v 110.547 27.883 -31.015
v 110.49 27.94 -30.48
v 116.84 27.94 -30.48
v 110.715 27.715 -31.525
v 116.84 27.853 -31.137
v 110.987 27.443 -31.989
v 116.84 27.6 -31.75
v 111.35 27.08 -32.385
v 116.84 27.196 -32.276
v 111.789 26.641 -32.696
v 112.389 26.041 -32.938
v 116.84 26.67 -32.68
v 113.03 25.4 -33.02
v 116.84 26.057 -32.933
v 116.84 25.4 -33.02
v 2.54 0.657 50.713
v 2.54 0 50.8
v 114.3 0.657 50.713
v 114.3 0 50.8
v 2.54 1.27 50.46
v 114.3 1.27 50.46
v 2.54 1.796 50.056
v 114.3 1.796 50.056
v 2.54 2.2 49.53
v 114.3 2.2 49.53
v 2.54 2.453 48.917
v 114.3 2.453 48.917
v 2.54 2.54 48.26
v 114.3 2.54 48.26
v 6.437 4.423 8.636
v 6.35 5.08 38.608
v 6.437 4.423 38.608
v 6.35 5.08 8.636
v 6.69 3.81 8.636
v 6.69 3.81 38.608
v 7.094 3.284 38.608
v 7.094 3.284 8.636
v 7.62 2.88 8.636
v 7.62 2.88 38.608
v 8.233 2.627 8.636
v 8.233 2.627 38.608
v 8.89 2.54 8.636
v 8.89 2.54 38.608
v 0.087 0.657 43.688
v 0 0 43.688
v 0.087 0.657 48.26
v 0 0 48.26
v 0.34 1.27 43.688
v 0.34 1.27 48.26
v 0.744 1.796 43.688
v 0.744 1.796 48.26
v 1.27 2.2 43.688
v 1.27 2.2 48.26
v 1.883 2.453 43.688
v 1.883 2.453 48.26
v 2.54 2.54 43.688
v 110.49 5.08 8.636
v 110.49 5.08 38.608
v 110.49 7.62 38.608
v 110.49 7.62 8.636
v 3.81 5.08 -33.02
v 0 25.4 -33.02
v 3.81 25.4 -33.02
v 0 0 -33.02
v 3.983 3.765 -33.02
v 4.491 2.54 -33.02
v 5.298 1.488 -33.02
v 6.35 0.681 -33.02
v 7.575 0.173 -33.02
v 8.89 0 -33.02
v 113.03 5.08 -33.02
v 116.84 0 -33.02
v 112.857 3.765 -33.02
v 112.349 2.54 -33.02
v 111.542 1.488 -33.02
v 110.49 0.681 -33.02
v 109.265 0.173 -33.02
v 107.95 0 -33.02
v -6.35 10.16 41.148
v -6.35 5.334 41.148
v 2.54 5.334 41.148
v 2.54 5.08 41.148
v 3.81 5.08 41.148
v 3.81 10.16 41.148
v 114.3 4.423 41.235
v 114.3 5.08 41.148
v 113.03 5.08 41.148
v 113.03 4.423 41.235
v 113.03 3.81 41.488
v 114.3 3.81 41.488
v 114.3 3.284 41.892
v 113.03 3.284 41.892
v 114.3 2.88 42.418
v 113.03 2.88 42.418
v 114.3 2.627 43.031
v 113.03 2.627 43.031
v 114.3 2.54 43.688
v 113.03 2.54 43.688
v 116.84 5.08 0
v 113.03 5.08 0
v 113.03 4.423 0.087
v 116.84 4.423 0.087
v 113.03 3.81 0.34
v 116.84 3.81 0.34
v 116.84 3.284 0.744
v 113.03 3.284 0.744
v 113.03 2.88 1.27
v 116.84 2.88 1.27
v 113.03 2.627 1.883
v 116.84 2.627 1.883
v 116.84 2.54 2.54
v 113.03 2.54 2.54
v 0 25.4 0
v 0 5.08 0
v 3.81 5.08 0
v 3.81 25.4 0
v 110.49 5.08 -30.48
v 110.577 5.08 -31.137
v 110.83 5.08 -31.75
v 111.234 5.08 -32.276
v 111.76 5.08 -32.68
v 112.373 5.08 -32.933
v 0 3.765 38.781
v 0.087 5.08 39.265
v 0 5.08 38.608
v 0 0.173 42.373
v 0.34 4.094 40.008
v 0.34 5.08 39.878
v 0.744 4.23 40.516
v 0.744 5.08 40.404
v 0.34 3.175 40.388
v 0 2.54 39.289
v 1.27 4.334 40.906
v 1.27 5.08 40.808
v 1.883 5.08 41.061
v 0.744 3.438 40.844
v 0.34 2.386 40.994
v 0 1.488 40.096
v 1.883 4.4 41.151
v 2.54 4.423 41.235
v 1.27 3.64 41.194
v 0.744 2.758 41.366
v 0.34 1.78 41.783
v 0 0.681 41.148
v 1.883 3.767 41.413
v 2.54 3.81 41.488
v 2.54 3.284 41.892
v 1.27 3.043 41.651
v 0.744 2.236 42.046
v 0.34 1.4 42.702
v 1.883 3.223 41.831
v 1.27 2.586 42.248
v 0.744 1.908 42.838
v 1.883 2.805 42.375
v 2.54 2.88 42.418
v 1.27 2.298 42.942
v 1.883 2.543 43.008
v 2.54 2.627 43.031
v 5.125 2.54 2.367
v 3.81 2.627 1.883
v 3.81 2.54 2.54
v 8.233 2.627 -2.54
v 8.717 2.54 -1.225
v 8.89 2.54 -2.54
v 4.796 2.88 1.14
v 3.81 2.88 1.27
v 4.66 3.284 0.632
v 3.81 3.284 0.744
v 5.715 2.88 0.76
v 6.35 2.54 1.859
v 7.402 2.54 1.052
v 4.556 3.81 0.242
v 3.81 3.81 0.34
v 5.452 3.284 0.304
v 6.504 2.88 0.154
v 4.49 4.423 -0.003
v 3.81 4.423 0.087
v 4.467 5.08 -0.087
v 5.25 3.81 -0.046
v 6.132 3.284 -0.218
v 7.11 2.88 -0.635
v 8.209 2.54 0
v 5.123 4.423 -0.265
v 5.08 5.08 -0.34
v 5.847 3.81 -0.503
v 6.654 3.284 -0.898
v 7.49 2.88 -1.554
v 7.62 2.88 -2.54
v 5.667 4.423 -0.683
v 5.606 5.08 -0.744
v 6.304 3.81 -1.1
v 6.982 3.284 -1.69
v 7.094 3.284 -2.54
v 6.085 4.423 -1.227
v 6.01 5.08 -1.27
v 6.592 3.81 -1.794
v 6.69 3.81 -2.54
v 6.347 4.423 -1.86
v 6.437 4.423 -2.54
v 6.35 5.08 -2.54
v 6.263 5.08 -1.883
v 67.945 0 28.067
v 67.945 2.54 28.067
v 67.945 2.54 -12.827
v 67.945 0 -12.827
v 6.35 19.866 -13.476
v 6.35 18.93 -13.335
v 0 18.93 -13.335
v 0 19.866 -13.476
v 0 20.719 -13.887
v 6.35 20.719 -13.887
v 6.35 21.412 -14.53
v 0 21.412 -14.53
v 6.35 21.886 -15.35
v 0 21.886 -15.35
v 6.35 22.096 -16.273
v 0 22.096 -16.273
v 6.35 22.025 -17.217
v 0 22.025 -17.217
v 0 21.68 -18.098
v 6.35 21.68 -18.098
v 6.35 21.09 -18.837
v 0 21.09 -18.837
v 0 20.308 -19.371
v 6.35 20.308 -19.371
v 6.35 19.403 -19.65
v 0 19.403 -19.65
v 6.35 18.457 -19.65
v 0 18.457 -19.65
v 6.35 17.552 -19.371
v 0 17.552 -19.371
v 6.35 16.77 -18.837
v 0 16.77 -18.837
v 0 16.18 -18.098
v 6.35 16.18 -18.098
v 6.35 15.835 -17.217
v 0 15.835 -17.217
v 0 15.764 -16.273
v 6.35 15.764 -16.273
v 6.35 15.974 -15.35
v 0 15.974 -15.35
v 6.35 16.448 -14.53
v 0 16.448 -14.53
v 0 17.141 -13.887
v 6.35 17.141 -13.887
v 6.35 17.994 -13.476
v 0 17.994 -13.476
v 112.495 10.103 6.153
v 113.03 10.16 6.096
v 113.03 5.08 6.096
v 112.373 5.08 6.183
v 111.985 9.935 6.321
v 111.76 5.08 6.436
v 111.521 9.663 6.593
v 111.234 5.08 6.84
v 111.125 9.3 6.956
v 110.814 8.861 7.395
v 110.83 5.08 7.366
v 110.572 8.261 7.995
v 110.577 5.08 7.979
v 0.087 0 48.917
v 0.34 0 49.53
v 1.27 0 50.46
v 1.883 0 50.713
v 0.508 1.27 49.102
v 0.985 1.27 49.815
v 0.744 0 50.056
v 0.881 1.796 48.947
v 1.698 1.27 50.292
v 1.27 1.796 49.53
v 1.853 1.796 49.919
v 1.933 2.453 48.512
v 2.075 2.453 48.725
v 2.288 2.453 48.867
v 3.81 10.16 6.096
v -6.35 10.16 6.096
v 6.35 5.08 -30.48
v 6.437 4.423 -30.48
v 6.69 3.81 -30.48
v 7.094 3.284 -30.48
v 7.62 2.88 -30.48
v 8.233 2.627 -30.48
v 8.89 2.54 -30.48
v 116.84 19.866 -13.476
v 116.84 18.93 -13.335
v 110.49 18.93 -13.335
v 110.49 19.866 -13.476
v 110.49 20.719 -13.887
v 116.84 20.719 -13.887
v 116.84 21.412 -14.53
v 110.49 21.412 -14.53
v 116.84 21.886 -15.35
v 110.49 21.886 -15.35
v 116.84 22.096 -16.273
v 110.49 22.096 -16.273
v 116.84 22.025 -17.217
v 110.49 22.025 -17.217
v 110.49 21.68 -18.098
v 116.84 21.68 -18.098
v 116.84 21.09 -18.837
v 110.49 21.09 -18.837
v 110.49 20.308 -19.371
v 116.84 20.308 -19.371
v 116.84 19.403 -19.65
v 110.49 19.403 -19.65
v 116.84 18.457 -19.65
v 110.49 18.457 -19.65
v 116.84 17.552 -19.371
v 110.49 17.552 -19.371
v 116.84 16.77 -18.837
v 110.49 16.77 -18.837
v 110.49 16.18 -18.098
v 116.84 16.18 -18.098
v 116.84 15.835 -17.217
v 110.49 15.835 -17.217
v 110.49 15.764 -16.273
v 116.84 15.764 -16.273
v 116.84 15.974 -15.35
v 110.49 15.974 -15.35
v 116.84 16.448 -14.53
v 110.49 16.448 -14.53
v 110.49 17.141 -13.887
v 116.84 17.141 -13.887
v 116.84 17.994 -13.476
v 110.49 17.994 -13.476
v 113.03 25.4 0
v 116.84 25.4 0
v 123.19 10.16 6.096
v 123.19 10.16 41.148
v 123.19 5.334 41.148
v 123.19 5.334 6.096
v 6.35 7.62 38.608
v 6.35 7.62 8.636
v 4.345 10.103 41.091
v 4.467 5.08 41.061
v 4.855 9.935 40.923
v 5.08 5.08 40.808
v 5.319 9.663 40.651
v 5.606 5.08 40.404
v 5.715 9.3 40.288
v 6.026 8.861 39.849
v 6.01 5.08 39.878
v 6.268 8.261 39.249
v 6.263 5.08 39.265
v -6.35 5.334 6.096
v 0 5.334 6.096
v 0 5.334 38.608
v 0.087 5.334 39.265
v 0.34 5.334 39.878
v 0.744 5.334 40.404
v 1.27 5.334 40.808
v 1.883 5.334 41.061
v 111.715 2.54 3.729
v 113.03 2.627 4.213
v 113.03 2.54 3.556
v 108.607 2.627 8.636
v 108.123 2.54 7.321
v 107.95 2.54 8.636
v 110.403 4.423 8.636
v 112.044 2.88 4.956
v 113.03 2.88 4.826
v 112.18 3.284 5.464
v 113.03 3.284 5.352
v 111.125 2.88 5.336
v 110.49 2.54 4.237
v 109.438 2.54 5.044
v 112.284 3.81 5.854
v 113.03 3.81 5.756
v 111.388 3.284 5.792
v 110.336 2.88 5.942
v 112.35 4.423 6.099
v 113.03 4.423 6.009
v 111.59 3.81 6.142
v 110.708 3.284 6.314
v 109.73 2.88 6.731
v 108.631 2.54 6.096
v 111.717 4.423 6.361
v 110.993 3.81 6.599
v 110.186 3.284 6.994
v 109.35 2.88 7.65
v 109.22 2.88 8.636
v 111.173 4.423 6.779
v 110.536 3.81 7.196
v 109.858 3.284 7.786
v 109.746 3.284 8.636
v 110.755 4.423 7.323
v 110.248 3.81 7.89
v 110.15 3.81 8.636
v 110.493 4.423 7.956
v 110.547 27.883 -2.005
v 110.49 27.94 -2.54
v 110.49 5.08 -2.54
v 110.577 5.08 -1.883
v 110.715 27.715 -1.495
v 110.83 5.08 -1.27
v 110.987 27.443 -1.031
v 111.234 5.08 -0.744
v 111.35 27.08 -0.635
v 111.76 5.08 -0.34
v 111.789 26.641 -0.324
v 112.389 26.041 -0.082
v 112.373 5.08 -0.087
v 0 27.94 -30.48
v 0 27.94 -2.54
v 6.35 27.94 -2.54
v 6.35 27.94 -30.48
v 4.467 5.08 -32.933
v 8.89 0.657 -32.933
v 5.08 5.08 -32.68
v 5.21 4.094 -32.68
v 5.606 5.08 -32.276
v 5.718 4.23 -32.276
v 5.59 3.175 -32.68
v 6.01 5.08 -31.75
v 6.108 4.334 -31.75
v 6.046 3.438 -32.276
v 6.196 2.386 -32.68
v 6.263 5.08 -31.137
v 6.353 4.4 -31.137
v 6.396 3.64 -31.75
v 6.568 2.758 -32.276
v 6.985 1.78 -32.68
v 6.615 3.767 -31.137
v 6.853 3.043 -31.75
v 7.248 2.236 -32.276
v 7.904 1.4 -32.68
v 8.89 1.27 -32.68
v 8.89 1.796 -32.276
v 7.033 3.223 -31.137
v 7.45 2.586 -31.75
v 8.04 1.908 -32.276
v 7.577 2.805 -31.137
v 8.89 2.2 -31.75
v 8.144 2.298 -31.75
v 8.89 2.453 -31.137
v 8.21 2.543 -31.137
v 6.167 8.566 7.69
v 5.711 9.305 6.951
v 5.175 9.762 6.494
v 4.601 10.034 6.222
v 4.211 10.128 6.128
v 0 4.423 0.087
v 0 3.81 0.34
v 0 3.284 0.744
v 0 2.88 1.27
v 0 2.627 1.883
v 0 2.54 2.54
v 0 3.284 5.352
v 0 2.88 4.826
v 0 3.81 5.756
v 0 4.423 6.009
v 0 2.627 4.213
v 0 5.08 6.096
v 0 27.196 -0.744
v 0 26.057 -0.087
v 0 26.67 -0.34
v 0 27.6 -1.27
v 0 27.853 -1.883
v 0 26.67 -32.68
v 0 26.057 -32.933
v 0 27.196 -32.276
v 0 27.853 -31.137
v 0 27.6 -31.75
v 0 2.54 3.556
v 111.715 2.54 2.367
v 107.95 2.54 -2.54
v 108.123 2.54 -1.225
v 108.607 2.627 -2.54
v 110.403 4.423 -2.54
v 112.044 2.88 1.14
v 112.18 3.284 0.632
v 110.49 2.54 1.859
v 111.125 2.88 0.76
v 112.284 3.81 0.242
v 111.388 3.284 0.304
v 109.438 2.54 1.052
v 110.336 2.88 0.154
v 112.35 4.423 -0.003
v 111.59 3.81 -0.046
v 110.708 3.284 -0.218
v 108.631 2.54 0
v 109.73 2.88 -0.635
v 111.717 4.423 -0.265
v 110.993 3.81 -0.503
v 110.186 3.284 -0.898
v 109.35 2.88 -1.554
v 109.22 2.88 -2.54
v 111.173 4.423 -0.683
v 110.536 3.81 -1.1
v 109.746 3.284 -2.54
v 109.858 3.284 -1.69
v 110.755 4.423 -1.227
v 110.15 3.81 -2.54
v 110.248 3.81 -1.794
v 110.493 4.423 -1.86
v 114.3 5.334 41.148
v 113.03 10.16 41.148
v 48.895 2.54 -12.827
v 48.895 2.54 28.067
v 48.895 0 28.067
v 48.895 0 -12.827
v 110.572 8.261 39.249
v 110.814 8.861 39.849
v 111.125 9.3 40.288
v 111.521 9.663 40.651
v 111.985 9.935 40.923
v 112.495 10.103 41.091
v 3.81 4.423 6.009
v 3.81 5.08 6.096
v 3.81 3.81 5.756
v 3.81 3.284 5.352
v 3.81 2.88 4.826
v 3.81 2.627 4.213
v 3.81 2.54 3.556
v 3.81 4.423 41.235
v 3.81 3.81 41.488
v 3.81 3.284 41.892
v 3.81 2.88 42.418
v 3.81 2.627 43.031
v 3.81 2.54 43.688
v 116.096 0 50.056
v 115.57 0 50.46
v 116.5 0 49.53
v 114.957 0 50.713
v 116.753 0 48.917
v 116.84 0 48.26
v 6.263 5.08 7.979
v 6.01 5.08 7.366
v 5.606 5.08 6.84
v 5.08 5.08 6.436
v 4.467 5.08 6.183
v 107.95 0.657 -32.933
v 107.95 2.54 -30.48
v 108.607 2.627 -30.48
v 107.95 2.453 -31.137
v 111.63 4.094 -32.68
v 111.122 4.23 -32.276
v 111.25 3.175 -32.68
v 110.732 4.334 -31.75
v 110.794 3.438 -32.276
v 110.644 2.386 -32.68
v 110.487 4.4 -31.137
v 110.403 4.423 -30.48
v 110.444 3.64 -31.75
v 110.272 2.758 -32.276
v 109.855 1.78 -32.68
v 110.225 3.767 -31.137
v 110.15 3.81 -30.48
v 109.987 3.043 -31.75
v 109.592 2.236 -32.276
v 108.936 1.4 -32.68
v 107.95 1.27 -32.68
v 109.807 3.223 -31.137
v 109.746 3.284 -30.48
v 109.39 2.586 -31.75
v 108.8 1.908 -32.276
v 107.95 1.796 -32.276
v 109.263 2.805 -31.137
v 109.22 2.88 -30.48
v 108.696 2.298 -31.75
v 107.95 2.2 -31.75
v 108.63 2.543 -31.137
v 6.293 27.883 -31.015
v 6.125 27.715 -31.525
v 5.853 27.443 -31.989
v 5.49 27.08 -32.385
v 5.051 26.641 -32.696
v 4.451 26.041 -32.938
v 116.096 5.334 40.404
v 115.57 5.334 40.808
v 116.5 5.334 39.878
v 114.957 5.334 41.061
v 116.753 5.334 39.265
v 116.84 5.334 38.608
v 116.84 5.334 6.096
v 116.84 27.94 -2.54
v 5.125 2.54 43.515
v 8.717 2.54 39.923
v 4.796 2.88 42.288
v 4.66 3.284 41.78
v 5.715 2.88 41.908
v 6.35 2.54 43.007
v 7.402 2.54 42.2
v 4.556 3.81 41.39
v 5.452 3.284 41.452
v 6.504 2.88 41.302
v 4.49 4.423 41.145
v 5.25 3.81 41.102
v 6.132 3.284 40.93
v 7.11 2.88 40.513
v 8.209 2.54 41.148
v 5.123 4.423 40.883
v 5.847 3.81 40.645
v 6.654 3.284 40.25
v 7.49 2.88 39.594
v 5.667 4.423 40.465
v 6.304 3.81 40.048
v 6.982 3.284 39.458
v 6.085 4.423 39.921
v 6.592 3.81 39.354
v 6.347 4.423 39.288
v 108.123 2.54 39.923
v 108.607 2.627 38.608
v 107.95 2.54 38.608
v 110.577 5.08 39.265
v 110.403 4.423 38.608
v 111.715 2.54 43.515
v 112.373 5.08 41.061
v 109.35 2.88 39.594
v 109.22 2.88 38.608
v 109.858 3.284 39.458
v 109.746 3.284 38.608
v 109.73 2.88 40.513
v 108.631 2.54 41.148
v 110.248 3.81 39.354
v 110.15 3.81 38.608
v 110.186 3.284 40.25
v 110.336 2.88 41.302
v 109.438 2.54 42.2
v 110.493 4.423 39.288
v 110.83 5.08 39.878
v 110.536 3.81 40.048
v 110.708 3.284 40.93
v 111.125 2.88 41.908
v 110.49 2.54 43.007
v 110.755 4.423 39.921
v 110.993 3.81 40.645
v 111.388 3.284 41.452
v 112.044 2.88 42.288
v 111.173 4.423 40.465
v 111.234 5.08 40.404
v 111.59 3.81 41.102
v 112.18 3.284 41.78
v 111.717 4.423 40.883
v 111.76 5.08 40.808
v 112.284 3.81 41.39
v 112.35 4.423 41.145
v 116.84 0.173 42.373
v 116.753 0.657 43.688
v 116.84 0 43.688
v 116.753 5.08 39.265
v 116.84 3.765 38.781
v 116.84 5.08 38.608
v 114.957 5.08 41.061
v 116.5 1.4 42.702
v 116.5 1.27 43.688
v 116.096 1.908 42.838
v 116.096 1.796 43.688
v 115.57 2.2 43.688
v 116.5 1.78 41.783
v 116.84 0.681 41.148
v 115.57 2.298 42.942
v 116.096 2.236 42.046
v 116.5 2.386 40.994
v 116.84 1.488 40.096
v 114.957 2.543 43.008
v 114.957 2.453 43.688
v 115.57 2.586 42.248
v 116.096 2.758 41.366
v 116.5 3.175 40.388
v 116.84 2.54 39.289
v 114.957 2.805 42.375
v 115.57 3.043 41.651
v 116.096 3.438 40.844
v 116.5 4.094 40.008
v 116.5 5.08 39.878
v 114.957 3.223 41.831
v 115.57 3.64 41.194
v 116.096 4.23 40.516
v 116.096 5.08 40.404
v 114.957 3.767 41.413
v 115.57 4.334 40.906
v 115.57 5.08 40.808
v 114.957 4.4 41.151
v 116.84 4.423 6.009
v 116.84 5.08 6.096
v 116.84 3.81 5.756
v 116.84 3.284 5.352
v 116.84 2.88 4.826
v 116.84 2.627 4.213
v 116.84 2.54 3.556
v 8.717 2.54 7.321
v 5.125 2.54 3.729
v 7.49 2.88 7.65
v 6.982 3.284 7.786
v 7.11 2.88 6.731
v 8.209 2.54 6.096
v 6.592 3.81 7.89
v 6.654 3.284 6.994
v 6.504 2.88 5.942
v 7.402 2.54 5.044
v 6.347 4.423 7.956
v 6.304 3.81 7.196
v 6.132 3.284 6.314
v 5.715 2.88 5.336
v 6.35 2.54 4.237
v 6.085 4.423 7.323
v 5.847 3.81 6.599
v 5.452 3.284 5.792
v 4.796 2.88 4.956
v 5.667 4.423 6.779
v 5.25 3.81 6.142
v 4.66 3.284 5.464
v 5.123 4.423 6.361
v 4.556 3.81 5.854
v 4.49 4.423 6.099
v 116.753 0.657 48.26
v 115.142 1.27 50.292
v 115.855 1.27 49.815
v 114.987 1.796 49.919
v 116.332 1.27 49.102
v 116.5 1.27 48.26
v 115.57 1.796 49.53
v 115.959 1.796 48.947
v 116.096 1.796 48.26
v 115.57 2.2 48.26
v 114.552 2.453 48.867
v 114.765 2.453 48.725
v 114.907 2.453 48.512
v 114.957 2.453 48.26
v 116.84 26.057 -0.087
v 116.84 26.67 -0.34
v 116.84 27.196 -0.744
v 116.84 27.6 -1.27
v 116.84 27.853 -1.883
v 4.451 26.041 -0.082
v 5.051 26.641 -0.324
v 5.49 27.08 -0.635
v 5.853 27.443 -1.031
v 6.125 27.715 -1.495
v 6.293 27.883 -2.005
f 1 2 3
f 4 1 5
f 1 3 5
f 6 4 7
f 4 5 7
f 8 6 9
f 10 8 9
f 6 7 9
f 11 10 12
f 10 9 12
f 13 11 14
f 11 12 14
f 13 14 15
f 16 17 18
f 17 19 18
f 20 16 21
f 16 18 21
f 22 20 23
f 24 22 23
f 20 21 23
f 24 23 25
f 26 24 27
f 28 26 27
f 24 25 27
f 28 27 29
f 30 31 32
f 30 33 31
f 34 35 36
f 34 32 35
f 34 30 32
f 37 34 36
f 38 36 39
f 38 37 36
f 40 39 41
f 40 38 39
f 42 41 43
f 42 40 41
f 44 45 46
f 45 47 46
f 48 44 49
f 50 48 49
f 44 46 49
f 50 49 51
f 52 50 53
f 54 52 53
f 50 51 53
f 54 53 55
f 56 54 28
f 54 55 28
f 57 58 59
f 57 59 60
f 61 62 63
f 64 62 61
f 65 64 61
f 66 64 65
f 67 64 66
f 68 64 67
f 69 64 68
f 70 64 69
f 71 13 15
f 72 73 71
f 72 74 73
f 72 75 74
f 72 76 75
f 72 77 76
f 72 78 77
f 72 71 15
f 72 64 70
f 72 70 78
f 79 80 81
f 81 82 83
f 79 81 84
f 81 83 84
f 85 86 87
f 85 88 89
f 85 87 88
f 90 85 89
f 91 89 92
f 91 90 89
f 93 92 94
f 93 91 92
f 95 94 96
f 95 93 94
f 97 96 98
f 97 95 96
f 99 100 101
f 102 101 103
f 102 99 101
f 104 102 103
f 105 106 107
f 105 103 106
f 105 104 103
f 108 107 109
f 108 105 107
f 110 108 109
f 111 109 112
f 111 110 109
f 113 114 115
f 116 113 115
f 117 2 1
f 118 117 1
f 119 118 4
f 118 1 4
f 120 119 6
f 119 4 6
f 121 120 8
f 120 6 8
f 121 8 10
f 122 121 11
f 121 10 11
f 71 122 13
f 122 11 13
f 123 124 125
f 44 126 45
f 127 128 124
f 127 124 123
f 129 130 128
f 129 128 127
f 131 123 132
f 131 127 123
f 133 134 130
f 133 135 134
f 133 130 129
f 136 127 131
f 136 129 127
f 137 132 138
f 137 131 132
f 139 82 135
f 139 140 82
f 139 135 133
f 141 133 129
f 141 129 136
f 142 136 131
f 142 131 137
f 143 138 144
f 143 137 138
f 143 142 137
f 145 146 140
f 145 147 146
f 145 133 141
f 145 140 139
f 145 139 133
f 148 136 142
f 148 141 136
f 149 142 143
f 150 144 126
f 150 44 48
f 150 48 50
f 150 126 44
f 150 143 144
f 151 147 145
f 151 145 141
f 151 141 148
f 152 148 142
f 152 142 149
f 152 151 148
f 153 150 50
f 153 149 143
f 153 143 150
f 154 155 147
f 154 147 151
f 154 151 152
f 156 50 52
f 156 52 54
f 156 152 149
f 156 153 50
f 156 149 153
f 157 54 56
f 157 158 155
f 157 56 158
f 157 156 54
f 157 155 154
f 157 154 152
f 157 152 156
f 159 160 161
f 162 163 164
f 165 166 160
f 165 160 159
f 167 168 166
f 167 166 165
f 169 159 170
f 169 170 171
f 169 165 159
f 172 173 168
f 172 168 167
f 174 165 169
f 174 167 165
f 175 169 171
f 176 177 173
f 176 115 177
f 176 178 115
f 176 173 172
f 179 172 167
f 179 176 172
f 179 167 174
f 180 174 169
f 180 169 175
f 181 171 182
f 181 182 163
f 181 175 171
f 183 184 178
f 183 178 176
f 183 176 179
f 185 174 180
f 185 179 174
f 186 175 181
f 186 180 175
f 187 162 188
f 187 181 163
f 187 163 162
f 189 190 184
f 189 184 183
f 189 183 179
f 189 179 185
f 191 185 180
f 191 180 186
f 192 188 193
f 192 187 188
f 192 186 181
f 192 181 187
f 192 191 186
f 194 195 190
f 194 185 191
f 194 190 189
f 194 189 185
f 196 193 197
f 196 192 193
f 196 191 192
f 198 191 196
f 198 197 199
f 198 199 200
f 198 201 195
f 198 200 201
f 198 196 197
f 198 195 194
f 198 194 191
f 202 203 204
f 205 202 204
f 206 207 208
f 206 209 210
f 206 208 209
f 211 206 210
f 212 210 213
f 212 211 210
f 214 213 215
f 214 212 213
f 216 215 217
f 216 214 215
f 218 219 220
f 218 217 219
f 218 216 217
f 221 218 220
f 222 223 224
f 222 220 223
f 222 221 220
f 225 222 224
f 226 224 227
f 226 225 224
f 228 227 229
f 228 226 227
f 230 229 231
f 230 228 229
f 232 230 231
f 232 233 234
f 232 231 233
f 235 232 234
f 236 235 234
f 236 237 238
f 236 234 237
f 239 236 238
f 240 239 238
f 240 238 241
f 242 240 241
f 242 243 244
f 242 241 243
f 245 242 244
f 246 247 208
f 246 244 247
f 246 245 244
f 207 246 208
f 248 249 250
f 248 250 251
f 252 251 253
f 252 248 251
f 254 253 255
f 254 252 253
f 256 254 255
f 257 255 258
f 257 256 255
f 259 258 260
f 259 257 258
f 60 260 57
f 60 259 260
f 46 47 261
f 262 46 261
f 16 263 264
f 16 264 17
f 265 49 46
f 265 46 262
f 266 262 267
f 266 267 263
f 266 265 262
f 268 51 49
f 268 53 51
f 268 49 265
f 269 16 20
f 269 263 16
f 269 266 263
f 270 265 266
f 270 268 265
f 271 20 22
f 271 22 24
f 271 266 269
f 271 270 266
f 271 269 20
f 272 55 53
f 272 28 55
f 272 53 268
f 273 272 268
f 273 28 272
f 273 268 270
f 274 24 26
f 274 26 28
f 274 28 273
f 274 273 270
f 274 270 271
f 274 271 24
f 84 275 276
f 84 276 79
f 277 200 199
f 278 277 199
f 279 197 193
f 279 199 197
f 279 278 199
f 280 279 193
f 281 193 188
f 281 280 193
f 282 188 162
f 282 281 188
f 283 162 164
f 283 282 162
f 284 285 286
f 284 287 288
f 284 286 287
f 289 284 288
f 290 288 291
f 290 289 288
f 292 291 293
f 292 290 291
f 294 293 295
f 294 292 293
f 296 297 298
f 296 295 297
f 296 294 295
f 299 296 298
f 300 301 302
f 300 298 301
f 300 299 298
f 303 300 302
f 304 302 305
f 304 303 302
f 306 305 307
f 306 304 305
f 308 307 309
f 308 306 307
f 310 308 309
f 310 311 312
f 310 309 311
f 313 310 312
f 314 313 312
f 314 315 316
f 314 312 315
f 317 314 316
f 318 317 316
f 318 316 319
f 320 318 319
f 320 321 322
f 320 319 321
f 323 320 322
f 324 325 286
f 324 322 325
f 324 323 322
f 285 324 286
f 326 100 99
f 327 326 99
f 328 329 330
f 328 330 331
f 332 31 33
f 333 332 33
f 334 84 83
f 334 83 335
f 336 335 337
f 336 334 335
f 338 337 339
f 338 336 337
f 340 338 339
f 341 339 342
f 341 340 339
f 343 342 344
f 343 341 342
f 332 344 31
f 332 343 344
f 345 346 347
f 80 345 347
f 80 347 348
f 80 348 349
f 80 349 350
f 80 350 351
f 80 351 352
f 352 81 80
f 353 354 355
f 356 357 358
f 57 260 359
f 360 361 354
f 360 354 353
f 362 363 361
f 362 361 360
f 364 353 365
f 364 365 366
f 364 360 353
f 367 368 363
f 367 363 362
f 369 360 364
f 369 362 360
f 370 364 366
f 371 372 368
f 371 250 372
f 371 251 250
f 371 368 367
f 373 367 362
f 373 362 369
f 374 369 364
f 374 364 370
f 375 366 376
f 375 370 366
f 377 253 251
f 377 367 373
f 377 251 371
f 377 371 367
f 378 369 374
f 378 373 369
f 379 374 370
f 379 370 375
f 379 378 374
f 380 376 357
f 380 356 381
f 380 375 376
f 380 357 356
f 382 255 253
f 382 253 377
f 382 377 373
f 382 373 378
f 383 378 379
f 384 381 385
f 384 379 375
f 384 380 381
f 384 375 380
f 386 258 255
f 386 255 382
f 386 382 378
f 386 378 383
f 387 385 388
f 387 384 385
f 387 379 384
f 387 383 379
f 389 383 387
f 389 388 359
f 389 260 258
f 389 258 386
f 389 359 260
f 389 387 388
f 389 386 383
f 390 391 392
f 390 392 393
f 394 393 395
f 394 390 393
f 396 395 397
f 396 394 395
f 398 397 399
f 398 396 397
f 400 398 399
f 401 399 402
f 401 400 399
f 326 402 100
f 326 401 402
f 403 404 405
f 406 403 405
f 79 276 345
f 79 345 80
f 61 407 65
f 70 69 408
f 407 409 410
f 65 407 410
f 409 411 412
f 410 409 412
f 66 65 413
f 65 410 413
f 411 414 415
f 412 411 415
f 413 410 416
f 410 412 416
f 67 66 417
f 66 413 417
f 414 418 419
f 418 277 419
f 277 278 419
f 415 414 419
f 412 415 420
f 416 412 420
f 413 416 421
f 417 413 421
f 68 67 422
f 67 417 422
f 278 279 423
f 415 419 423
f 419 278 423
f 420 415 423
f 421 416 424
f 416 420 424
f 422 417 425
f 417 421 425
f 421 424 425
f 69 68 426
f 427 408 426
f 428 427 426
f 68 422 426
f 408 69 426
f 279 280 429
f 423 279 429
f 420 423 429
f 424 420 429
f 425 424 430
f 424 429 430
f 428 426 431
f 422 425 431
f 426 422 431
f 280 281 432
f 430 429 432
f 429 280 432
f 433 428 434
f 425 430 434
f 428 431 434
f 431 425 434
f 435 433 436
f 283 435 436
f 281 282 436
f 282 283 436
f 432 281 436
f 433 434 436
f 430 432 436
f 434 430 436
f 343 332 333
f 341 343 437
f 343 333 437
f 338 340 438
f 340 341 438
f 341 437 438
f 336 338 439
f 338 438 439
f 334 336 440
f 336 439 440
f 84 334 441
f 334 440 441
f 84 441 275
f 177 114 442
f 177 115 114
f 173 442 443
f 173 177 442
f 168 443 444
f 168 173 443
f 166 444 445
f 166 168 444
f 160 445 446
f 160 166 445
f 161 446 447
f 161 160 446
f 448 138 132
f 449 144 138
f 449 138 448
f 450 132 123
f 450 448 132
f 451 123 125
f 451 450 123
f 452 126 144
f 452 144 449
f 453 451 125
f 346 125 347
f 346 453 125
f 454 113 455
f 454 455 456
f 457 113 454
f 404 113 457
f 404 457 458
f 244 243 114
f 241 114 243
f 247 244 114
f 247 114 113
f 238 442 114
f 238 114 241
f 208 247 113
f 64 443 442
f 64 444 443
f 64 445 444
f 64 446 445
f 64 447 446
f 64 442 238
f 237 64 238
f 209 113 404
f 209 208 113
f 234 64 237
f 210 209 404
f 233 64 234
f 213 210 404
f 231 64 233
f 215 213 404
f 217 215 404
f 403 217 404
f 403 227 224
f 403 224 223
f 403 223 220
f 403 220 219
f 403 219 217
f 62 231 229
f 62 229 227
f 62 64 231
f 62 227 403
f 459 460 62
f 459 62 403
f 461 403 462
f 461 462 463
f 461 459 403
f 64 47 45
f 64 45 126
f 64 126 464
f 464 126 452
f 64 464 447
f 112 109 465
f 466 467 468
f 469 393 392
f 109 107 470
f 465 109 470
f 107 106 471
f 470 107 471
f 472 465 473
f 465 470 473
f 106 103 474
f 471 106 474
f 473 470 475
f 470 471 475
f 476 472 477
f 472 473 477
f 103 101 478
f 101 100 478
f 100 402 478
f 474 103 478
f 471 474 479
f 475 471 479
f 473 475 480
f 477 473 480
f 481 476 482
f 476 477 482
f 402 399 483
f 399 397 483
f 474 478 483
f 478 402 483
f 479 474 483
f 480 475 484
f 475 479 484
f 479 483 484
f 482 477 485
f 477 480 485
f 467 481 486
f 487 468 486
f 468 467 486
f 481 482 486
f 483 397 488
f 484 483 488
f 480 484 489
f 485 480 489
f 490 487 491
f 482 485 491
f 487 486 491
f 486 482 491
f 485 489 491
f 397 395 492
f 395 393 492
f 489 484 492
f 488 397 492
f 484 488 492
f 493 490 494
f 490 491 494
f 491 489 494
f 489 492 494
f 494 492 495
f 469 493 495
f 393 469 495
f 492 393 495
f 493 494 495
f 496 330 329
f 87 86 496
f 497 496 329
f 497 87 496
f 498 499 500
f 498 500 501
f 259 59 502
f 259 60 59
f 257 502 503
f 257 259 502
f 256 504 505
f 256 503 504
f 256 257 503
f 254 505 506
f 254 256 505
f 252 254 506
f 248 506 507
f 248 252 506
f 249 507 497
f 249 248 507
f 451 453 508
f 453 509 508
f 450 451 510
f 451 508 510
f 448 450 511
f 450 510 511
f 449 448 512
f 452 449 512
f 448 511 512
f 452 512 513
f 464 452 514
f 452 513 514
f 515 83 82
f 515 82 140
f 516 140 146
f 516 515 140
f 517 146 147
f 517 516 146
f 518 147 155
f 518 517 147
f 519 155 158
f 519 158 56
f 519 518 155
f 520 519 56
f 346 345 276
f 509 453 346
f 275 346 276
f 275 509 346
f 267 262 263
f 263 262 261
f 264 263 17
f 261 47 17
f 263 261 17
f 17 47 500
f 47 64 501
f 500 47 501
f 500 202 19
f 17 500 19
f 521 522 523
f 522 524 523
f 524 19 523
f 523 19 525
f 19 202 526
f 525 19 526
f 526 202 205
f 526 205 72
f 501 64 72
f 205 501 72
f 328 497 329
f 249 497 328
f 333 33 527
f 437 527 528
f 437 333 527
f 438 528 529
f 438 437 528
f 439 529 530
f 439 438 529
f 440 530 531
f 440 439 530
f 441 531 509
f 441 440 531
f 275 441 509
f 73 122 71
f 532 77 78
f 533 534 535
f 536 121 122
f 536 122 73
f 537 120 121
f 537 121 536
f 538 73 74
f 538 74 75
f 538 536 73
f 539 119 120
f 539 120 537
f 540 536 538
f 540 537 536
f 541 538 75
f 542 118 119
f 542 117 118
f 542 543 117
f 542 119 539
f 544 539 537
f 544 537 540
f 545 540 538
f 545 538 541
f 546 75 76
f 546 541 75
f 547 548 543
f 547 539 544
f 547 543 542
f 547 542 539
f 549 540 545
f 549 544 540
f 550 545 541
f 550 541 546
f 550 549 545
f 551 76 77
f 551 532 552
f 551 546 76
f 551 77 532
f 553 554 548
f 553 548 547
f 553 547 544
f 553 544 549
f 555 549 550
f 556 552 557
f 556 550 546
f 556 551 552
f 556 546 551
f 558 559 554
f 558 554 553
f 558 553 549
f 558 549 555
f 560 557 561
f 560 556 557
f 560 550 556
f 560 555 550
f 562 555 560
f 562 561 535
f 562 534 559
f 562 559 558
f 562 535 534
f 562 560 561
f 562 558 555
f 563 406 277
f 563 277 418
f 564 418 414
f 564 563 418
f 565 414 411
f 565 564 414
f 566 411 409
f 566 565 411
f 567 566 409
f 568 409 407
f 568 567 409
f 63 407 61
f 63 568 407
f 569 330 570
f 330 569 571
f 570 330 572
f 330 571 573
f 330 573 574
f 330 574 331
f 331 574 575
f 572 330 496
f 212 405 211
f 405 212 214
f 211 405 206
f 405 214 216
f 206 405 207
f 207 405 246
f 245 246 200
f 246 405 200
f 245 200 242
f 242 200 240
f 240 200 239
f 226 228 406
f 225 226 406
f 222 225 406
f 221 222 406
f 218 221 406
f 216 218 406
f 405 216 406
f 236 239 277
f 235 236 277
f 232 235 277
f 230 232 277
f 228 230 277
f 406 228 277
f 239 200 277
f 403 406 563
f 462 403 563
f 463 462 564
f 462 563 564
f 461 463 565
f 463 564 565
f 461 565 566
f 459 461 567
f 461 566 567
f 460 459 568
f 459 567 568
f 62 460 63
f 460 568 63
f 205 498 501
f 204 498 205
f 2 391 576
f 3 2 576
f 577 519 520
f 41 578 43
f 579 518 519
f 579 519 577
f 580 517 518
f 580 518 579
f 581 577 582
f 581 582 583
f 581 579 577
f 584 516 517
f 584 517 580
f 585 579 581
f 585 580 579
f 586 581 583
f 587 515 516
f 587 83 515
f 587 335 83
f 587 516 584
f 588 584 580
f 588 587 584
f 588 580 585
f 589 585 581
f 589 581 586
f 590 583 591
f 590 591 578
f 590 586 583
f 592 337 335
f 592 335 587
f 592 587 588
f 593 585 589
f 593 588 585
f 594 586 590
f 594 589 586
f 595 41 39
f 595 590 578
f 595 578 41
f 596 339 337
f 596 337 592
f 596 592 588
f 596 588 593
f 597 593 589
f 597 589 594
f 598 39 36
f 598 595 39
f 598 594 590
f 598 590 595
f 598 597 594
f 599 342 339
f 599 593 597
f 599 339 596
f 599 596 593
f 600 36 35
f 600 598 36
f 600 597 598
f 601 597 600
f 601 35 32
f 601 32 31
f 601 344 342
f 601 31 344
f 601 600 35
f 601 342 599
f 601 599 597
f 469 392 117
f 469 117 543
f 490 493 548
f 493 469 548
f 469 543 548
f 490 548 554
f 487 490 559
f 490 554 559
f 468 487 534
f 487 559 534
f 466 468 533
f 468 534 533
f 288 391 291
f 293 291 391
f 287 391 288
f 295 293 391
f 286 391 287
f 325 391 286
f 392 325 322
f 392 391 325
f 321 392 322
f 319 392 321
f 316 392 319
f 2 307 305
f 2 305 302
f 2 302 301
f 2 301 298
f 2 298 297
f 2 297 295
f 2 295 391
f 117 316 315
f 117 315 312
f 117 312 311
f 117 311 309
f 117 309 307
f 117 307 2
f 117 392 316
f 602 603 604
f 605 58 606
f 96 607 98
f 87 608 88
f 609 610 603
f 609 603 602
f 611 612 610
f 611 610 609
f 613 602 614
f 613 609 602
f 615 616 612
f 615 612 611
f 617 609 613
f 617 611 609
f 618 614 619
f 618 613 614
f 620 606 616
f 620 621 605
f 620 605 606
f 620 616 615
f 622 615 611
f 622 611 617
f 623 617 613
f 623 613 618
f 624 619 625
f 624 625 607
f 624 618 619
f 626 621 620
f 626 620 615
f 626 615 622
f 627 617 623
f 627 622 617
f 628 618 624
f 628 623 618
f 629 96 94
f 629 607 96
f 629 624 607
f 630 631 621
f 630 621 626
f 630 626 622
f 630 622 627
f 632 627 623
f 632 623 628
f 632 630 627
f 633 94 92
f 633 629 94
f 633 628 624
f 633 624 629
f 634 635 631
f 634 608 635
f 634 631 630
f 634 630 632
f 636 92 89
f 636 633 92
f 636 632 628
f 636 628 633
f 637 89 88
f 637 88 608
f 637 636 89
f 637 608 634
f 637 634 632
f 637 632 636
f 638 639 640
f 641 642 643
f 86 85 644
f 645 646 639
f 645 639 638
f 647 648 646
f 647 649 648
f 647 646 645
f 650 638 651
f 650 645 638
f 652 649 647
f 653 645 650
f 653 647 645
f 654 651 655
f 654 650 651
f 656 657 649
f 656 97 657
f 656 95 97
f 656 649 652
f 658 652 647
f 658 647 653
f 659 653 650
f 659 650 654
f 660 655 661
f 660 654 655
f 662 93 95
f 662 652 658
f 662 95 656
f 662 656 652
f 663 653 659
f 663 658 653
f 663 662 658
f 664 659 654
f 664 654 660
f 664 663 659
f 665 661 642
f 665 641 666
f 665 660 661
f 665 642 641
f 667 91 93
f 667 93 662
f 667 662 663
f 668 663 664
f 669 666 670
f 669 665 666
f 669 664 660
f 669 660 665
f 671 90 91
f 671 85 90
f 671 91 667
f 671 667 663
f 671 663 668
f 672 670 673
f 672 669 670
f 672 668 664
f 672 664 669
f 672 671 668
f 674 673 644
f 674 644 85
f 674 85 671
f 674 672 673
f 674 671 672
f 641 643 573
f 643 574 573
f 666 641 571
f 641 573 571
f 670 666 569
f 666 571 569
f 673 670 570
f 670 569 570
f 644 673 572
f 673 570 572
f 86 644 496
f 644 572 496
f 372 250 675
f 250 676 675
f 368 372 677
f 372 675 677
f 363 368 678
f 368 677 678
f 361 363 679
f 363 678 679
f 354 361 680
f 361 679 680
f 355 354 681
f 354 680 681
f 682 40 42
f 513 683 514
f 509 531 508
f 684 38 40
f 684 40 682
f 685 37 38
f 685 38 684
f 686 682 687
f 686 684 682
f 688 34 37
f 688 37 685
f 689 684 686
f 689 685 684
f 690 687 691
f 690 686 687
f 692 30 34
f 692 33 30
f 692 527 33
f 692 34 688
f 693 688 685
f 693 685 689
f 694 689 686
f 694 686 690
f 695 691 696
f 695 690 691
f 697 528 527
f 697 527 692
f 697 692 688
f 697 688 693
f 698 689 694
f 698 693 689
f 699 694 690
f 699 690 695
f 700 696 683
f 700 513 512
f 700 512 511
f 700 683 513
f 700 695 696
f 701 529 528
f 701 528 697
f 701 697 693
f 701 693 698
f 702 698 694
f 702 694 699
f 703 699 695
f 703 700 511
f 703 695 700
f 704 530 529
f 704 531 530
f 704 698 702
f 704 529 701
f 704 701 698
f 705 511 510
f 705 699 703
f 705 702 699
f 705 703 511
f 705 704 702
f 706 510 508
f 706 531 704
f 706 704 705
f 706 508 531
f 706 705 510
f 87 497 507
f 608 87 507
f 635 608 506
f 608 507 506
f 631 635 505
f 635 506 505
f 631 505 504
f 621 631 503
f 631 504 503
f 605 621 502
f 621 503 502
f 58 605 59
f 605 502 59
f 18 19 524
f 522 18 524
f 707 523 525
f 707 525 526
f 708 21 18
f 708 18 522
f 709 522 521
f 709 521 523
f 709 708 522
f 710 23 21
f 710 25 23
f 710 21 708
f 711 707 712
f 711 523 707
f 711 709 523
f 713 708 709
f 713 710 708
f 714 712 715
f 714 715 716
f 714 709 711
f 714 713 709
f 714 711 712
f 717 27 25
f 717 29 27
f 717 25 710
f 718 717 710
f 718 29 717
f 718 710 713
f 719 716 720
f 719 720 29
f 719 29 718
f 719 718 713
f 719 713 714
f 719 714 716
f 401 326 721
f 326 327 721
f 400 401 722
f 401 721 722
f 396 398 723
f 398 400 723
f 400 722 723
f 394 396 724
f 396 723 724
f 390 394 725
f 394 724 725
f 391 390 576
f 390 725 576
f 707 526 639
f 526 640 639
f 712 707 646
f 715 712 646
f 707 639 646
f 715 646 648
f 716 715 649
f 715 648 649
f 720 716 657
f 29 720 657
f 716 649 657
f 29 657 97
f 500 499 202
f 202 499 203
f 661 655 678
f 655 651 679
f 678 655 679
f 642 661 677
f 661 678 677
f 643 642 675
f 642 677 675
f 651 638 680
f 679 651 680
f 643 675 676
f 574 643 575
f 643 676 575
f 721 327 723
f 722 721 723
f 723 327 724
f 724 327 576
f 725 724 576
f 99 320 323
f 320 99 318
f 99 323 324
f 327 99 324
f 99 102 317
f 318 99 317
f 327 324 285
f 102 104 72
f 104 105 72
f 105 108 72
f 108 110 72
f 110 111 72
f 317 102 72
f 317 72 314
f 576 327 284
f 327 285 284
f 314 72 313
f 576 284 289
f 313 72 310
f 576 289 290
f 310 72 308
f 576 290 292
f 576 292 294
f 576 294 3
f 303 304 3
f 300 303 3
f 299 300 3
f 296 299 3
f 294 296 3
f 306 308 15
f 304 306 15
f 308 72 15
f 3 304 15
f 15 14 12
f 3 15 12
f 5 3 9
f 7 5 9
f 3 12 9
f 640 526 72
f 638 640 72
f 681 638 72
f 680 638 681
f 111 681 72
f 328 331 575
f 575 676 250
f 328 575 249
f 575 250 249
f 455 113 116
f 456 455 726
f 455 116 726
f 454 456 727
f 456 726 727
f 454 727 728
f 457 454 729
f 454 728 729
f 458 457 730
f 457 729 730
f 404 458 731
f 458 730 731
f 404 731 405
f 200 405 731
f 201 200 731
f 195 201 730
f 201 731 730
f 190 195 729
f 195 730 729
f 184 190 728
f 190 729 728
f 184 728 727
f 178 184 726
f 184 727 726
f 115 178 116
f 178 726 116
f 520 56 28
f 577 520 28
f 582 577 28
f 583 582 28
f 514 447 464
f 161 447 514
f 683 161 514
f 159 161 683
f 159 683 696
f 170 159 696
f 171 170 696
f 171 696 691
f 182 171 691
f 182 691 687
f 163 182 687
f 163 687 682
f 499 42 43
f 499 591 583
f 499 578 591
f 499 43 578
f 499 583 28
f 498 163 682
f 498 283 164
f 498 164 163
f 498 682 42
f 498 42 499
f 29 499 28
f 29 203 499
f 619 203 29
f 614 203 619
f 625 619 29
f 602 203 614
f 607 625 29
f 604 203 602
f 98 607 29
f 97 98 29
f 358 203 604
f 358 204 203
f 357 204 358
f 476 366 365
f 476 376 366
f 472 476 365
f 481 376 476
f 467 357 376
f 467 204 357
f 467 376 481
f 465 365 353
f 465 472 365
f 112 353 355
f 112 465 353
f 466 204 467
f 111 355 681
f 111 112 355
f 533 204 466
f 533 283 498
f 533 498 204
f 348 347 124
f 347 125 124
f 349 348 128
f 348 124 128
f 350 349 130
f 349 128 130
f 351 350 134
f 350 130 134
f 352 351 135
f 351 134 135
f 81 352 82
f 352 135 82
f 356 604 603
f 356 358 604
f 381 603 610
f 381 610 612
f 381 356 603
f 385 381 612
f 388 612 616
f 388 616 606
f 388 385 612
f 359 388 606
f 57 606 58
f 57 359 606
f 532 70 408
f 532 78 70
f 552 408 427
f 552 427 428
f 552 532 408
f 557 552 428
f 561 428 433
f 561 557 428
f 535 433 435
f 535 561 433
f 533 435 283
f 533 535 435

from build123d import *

# Parameters (mm, degrees)
SKETCH2_W               = 116.84
SKETCH2_H               = 33.02
BOSS_EXTRUDE1_DEPTH     = 2.54
SKETCH3_W               = 6.35
SKETCH3_H               = 33.02
BOSS_EXTRUDE2_DEPTH     = 25.4
CUT_EXTRUDE1_DEPTH      = 125.589524439
CUT_EXTRUDE1_DEPTH_BACK = 125.589524439
SKETCH4_R               = 3.175
SKETCH5_W               = 116.84
SKETCH5_H               = 2.54
BOSS_EXTRUDE3_DEPTH     = 50.8
SKETCH6_W               = 6.35
SKETCH6_H               = 35.052
BOSS_EXTRUDE4_DEPTH     = 7.62
SKETCH7_W               = 35.052
SKETCH7_H               = 4.826
BOSS_EXTRUDE5_DEPTH     = 6.35
SKETCH8_W               = 35.052
SKETCH8_H               = 4.826
BOSS_EXTRUDE6_DEPTH     = 6.35
FILLET1_R               = 2.54
FILLET7_R               = 2.54
FILLET8_R               = 2.54
CUT_EXTRUDE2_REACH      = 137.652
SKETCH16_W              = 19.05
SKETCH16_H              = 40.894


with BuildPart() as part:
    # Sketch2 → Boss-Extrude1 (new body)
    with BuildSketch(Plane(origin=(0, 0, 0), x_dir=(1, 0, 0), z_dir=(0, 1, 0))):
        with Locations((58.42, 16.51)):
            Rectangle(SKETCH2_W, SKETCH2_H)
    extrude(amount=BOSS_EXTRUDE1_DEPTH)

    # Sketch3 → Boss-Extrude2 (add)
    with BuildSketch(Plane(origin=(0, 2.54, 0), x_dir=(1, 0, 0), z_dir=(0, 1, 0))):
        with Locations((3.175, 16.51)):
            Rectangle(SKETCH3_W, SKETCH3_H)
        with Locations((113.665, 16.51)):
            Rectangle(SKETCH3_W, SKETCH3_H)
    extrude(amount=BOSS_EXTRUDE2_DEPTH)

    # Sketch4 → Cut-Extrude1 (cut, two sides: drawn at the far end of the back side and taken through both)
    with BuildSketch(Plane.ZY.offset(-CUT_EXTRUDE1_DEPTH_BACK)):
        with Locations((-16.51, 18.93000799)):
            Circle(SKETCH4_R)
    extrude(amount=CUT_EXTRUDE1_DEPTH + CUT_EXTRUDE1_DEPTH_BACK, mode=Mode.SUBTRACT)

    # Sketch5 → Boss-Extrude3 (add)
    with BuildSketch(Plane.XY):
        with Locations((58.42, 1.27)):
            Rectangle(SKETCH5_W, SKETCH5_H)
    extrude(amount=BOSS_EXTRUDE3_DEPTH)

    # Sketch6 → Boss-Extrude4 (add)
    with BuildSketch(Plane(origin=(0, 2.54, 0), x_dir=(1, 0, 0), z_dir=(0, 1, 0))):
        with Locations((3.175, -23.622)):
            Rectangle(SKETCH6_W, SKETCH6_H)
        with Locations((113.665, -23.622)):
            Rectangle(SKETCH6_W, SKETCH6_H)
    extrude(amount=BOSS_EXTRUDE4_DEPTH)

    # Sketch7 → Boss-Extrude5 (add)
    with BuildSketch(Plane.ZY):
        with Locations((23.622, 7.747)):
            Rectangle(SKETCH7_W, SKETCH7_H)
    extrude(amount=BOSS_EXTRUDE5_DEPTH)

    # Sketch8 → Boss-Extrude6 (add)
    with BuildSketch(Plane(origin=(116.84, 0, 0), x_dir=(0, 0, -1), z_dir=(1, 0, 0))):
        with Locations((-23.622, 7.747)):
            Rectangle(SKETCH8_W, SKETCH8_H)
    extrude(amount=BOSS_EXTRUDE6_DEPTH)

    # Fillet1
    fillet1_edges = [part.edges().sort_by_distance(p)[0] for p in [
        (6.35, 2.54, -16.51),
        (6.35, 15.24, 0),
        (6.35, 15.24, -33.02),
        (3.175, 27.94, 0),
        (3.175, 27.94, -33.02),
        (58.42, 2.54, -33.02),
        (110.49, 2.54, -16.51),
        (110.49, 15.24, -33.02),
        (110.49, 15.24, 0),
        (113.665, 27.94, 0),
        (113.665, 27.94, -33.02),
        (3.175, 2.54, 0),
        (113.665, 2.54, 0),
        (3.175, 2.54, 41.148),
        (6.35, 2.54, 23.622),
        (6.35, 6.35, 41.148),
        (3.175, 2.54, 6.096),
        (6.35, 6.35, 6.096),
        (6.35, 10.16, 23.622),
        (113.665, 2.54, 6.096),
        (110.49, 2.54, 23.622),
        (110.49, 6.35, 6.096),
        (113.665, 2.54, 41.148),
        (110.49, 6.35, 41.148),
        (110.49, 10.16, 23.622),
    ]]
    fillet(fillet1_edges, radius=FILLET1_R - 0.0001)  # a hair under: the kernel refuses the full size

    # Fillet7
    fillet7_edges = [part.edges().sort_by_distance(p)[0] for p in [
        (0, 1.27, 50.8),
        (116.84, 1.27, 50.8),
    ]]
    fillet(fillet7_edges, radius=FILLET7_R)

    # Fillet8
    fillet8_edges = [part.edges().sort_by_distance(p)[0] for p in [
        (116.84, 5.20695, 41.148),
        (116.84, 3.283919486, 41.891919486),
        (116.84, 2.54, 45.97395),
        (116.096051224, 2.54, 50.056051224),
        (0, 5.20695, 41.148),
        (0, 3.283919486, 41.891919486),
        (0, 2.54, 45.97395),
        (0.743948776, 2.54, 50.056051224),
        (58.42, 2.54, 50.8),
    ]]
    fillet(fillet8_edges, radius=FILLET8_R - 0.0001)  # a hair under: the kernel refuses the full size

    # Sketch16 → Cut-Extrude2 (cut, up to next)
    with BuildSketch(Plane(origin=(0, 2.54, 0), x_dir=(1, 0, 0), z_dir=(0, 1, 0)), mode=Mode.PRIVATE) as cut_extrude2_sk1:
        with Locations((58.42, -7.62)):
            Rectangle(SKETCH16_W, SKETCH16_H)
    cut_extrude2_tool1 = extrude(cut_extrude2_sk1.sketch, amount=-CUT_EXTRUDE2_REACH, mode=Mode.PRIVATE) & part.part
    add(cut_extrude2_tool1.solids().sort_by_distance((58.42, 2.54, 7.62))[0], mode=Mode.SUBTRACT)


solid = part.part
